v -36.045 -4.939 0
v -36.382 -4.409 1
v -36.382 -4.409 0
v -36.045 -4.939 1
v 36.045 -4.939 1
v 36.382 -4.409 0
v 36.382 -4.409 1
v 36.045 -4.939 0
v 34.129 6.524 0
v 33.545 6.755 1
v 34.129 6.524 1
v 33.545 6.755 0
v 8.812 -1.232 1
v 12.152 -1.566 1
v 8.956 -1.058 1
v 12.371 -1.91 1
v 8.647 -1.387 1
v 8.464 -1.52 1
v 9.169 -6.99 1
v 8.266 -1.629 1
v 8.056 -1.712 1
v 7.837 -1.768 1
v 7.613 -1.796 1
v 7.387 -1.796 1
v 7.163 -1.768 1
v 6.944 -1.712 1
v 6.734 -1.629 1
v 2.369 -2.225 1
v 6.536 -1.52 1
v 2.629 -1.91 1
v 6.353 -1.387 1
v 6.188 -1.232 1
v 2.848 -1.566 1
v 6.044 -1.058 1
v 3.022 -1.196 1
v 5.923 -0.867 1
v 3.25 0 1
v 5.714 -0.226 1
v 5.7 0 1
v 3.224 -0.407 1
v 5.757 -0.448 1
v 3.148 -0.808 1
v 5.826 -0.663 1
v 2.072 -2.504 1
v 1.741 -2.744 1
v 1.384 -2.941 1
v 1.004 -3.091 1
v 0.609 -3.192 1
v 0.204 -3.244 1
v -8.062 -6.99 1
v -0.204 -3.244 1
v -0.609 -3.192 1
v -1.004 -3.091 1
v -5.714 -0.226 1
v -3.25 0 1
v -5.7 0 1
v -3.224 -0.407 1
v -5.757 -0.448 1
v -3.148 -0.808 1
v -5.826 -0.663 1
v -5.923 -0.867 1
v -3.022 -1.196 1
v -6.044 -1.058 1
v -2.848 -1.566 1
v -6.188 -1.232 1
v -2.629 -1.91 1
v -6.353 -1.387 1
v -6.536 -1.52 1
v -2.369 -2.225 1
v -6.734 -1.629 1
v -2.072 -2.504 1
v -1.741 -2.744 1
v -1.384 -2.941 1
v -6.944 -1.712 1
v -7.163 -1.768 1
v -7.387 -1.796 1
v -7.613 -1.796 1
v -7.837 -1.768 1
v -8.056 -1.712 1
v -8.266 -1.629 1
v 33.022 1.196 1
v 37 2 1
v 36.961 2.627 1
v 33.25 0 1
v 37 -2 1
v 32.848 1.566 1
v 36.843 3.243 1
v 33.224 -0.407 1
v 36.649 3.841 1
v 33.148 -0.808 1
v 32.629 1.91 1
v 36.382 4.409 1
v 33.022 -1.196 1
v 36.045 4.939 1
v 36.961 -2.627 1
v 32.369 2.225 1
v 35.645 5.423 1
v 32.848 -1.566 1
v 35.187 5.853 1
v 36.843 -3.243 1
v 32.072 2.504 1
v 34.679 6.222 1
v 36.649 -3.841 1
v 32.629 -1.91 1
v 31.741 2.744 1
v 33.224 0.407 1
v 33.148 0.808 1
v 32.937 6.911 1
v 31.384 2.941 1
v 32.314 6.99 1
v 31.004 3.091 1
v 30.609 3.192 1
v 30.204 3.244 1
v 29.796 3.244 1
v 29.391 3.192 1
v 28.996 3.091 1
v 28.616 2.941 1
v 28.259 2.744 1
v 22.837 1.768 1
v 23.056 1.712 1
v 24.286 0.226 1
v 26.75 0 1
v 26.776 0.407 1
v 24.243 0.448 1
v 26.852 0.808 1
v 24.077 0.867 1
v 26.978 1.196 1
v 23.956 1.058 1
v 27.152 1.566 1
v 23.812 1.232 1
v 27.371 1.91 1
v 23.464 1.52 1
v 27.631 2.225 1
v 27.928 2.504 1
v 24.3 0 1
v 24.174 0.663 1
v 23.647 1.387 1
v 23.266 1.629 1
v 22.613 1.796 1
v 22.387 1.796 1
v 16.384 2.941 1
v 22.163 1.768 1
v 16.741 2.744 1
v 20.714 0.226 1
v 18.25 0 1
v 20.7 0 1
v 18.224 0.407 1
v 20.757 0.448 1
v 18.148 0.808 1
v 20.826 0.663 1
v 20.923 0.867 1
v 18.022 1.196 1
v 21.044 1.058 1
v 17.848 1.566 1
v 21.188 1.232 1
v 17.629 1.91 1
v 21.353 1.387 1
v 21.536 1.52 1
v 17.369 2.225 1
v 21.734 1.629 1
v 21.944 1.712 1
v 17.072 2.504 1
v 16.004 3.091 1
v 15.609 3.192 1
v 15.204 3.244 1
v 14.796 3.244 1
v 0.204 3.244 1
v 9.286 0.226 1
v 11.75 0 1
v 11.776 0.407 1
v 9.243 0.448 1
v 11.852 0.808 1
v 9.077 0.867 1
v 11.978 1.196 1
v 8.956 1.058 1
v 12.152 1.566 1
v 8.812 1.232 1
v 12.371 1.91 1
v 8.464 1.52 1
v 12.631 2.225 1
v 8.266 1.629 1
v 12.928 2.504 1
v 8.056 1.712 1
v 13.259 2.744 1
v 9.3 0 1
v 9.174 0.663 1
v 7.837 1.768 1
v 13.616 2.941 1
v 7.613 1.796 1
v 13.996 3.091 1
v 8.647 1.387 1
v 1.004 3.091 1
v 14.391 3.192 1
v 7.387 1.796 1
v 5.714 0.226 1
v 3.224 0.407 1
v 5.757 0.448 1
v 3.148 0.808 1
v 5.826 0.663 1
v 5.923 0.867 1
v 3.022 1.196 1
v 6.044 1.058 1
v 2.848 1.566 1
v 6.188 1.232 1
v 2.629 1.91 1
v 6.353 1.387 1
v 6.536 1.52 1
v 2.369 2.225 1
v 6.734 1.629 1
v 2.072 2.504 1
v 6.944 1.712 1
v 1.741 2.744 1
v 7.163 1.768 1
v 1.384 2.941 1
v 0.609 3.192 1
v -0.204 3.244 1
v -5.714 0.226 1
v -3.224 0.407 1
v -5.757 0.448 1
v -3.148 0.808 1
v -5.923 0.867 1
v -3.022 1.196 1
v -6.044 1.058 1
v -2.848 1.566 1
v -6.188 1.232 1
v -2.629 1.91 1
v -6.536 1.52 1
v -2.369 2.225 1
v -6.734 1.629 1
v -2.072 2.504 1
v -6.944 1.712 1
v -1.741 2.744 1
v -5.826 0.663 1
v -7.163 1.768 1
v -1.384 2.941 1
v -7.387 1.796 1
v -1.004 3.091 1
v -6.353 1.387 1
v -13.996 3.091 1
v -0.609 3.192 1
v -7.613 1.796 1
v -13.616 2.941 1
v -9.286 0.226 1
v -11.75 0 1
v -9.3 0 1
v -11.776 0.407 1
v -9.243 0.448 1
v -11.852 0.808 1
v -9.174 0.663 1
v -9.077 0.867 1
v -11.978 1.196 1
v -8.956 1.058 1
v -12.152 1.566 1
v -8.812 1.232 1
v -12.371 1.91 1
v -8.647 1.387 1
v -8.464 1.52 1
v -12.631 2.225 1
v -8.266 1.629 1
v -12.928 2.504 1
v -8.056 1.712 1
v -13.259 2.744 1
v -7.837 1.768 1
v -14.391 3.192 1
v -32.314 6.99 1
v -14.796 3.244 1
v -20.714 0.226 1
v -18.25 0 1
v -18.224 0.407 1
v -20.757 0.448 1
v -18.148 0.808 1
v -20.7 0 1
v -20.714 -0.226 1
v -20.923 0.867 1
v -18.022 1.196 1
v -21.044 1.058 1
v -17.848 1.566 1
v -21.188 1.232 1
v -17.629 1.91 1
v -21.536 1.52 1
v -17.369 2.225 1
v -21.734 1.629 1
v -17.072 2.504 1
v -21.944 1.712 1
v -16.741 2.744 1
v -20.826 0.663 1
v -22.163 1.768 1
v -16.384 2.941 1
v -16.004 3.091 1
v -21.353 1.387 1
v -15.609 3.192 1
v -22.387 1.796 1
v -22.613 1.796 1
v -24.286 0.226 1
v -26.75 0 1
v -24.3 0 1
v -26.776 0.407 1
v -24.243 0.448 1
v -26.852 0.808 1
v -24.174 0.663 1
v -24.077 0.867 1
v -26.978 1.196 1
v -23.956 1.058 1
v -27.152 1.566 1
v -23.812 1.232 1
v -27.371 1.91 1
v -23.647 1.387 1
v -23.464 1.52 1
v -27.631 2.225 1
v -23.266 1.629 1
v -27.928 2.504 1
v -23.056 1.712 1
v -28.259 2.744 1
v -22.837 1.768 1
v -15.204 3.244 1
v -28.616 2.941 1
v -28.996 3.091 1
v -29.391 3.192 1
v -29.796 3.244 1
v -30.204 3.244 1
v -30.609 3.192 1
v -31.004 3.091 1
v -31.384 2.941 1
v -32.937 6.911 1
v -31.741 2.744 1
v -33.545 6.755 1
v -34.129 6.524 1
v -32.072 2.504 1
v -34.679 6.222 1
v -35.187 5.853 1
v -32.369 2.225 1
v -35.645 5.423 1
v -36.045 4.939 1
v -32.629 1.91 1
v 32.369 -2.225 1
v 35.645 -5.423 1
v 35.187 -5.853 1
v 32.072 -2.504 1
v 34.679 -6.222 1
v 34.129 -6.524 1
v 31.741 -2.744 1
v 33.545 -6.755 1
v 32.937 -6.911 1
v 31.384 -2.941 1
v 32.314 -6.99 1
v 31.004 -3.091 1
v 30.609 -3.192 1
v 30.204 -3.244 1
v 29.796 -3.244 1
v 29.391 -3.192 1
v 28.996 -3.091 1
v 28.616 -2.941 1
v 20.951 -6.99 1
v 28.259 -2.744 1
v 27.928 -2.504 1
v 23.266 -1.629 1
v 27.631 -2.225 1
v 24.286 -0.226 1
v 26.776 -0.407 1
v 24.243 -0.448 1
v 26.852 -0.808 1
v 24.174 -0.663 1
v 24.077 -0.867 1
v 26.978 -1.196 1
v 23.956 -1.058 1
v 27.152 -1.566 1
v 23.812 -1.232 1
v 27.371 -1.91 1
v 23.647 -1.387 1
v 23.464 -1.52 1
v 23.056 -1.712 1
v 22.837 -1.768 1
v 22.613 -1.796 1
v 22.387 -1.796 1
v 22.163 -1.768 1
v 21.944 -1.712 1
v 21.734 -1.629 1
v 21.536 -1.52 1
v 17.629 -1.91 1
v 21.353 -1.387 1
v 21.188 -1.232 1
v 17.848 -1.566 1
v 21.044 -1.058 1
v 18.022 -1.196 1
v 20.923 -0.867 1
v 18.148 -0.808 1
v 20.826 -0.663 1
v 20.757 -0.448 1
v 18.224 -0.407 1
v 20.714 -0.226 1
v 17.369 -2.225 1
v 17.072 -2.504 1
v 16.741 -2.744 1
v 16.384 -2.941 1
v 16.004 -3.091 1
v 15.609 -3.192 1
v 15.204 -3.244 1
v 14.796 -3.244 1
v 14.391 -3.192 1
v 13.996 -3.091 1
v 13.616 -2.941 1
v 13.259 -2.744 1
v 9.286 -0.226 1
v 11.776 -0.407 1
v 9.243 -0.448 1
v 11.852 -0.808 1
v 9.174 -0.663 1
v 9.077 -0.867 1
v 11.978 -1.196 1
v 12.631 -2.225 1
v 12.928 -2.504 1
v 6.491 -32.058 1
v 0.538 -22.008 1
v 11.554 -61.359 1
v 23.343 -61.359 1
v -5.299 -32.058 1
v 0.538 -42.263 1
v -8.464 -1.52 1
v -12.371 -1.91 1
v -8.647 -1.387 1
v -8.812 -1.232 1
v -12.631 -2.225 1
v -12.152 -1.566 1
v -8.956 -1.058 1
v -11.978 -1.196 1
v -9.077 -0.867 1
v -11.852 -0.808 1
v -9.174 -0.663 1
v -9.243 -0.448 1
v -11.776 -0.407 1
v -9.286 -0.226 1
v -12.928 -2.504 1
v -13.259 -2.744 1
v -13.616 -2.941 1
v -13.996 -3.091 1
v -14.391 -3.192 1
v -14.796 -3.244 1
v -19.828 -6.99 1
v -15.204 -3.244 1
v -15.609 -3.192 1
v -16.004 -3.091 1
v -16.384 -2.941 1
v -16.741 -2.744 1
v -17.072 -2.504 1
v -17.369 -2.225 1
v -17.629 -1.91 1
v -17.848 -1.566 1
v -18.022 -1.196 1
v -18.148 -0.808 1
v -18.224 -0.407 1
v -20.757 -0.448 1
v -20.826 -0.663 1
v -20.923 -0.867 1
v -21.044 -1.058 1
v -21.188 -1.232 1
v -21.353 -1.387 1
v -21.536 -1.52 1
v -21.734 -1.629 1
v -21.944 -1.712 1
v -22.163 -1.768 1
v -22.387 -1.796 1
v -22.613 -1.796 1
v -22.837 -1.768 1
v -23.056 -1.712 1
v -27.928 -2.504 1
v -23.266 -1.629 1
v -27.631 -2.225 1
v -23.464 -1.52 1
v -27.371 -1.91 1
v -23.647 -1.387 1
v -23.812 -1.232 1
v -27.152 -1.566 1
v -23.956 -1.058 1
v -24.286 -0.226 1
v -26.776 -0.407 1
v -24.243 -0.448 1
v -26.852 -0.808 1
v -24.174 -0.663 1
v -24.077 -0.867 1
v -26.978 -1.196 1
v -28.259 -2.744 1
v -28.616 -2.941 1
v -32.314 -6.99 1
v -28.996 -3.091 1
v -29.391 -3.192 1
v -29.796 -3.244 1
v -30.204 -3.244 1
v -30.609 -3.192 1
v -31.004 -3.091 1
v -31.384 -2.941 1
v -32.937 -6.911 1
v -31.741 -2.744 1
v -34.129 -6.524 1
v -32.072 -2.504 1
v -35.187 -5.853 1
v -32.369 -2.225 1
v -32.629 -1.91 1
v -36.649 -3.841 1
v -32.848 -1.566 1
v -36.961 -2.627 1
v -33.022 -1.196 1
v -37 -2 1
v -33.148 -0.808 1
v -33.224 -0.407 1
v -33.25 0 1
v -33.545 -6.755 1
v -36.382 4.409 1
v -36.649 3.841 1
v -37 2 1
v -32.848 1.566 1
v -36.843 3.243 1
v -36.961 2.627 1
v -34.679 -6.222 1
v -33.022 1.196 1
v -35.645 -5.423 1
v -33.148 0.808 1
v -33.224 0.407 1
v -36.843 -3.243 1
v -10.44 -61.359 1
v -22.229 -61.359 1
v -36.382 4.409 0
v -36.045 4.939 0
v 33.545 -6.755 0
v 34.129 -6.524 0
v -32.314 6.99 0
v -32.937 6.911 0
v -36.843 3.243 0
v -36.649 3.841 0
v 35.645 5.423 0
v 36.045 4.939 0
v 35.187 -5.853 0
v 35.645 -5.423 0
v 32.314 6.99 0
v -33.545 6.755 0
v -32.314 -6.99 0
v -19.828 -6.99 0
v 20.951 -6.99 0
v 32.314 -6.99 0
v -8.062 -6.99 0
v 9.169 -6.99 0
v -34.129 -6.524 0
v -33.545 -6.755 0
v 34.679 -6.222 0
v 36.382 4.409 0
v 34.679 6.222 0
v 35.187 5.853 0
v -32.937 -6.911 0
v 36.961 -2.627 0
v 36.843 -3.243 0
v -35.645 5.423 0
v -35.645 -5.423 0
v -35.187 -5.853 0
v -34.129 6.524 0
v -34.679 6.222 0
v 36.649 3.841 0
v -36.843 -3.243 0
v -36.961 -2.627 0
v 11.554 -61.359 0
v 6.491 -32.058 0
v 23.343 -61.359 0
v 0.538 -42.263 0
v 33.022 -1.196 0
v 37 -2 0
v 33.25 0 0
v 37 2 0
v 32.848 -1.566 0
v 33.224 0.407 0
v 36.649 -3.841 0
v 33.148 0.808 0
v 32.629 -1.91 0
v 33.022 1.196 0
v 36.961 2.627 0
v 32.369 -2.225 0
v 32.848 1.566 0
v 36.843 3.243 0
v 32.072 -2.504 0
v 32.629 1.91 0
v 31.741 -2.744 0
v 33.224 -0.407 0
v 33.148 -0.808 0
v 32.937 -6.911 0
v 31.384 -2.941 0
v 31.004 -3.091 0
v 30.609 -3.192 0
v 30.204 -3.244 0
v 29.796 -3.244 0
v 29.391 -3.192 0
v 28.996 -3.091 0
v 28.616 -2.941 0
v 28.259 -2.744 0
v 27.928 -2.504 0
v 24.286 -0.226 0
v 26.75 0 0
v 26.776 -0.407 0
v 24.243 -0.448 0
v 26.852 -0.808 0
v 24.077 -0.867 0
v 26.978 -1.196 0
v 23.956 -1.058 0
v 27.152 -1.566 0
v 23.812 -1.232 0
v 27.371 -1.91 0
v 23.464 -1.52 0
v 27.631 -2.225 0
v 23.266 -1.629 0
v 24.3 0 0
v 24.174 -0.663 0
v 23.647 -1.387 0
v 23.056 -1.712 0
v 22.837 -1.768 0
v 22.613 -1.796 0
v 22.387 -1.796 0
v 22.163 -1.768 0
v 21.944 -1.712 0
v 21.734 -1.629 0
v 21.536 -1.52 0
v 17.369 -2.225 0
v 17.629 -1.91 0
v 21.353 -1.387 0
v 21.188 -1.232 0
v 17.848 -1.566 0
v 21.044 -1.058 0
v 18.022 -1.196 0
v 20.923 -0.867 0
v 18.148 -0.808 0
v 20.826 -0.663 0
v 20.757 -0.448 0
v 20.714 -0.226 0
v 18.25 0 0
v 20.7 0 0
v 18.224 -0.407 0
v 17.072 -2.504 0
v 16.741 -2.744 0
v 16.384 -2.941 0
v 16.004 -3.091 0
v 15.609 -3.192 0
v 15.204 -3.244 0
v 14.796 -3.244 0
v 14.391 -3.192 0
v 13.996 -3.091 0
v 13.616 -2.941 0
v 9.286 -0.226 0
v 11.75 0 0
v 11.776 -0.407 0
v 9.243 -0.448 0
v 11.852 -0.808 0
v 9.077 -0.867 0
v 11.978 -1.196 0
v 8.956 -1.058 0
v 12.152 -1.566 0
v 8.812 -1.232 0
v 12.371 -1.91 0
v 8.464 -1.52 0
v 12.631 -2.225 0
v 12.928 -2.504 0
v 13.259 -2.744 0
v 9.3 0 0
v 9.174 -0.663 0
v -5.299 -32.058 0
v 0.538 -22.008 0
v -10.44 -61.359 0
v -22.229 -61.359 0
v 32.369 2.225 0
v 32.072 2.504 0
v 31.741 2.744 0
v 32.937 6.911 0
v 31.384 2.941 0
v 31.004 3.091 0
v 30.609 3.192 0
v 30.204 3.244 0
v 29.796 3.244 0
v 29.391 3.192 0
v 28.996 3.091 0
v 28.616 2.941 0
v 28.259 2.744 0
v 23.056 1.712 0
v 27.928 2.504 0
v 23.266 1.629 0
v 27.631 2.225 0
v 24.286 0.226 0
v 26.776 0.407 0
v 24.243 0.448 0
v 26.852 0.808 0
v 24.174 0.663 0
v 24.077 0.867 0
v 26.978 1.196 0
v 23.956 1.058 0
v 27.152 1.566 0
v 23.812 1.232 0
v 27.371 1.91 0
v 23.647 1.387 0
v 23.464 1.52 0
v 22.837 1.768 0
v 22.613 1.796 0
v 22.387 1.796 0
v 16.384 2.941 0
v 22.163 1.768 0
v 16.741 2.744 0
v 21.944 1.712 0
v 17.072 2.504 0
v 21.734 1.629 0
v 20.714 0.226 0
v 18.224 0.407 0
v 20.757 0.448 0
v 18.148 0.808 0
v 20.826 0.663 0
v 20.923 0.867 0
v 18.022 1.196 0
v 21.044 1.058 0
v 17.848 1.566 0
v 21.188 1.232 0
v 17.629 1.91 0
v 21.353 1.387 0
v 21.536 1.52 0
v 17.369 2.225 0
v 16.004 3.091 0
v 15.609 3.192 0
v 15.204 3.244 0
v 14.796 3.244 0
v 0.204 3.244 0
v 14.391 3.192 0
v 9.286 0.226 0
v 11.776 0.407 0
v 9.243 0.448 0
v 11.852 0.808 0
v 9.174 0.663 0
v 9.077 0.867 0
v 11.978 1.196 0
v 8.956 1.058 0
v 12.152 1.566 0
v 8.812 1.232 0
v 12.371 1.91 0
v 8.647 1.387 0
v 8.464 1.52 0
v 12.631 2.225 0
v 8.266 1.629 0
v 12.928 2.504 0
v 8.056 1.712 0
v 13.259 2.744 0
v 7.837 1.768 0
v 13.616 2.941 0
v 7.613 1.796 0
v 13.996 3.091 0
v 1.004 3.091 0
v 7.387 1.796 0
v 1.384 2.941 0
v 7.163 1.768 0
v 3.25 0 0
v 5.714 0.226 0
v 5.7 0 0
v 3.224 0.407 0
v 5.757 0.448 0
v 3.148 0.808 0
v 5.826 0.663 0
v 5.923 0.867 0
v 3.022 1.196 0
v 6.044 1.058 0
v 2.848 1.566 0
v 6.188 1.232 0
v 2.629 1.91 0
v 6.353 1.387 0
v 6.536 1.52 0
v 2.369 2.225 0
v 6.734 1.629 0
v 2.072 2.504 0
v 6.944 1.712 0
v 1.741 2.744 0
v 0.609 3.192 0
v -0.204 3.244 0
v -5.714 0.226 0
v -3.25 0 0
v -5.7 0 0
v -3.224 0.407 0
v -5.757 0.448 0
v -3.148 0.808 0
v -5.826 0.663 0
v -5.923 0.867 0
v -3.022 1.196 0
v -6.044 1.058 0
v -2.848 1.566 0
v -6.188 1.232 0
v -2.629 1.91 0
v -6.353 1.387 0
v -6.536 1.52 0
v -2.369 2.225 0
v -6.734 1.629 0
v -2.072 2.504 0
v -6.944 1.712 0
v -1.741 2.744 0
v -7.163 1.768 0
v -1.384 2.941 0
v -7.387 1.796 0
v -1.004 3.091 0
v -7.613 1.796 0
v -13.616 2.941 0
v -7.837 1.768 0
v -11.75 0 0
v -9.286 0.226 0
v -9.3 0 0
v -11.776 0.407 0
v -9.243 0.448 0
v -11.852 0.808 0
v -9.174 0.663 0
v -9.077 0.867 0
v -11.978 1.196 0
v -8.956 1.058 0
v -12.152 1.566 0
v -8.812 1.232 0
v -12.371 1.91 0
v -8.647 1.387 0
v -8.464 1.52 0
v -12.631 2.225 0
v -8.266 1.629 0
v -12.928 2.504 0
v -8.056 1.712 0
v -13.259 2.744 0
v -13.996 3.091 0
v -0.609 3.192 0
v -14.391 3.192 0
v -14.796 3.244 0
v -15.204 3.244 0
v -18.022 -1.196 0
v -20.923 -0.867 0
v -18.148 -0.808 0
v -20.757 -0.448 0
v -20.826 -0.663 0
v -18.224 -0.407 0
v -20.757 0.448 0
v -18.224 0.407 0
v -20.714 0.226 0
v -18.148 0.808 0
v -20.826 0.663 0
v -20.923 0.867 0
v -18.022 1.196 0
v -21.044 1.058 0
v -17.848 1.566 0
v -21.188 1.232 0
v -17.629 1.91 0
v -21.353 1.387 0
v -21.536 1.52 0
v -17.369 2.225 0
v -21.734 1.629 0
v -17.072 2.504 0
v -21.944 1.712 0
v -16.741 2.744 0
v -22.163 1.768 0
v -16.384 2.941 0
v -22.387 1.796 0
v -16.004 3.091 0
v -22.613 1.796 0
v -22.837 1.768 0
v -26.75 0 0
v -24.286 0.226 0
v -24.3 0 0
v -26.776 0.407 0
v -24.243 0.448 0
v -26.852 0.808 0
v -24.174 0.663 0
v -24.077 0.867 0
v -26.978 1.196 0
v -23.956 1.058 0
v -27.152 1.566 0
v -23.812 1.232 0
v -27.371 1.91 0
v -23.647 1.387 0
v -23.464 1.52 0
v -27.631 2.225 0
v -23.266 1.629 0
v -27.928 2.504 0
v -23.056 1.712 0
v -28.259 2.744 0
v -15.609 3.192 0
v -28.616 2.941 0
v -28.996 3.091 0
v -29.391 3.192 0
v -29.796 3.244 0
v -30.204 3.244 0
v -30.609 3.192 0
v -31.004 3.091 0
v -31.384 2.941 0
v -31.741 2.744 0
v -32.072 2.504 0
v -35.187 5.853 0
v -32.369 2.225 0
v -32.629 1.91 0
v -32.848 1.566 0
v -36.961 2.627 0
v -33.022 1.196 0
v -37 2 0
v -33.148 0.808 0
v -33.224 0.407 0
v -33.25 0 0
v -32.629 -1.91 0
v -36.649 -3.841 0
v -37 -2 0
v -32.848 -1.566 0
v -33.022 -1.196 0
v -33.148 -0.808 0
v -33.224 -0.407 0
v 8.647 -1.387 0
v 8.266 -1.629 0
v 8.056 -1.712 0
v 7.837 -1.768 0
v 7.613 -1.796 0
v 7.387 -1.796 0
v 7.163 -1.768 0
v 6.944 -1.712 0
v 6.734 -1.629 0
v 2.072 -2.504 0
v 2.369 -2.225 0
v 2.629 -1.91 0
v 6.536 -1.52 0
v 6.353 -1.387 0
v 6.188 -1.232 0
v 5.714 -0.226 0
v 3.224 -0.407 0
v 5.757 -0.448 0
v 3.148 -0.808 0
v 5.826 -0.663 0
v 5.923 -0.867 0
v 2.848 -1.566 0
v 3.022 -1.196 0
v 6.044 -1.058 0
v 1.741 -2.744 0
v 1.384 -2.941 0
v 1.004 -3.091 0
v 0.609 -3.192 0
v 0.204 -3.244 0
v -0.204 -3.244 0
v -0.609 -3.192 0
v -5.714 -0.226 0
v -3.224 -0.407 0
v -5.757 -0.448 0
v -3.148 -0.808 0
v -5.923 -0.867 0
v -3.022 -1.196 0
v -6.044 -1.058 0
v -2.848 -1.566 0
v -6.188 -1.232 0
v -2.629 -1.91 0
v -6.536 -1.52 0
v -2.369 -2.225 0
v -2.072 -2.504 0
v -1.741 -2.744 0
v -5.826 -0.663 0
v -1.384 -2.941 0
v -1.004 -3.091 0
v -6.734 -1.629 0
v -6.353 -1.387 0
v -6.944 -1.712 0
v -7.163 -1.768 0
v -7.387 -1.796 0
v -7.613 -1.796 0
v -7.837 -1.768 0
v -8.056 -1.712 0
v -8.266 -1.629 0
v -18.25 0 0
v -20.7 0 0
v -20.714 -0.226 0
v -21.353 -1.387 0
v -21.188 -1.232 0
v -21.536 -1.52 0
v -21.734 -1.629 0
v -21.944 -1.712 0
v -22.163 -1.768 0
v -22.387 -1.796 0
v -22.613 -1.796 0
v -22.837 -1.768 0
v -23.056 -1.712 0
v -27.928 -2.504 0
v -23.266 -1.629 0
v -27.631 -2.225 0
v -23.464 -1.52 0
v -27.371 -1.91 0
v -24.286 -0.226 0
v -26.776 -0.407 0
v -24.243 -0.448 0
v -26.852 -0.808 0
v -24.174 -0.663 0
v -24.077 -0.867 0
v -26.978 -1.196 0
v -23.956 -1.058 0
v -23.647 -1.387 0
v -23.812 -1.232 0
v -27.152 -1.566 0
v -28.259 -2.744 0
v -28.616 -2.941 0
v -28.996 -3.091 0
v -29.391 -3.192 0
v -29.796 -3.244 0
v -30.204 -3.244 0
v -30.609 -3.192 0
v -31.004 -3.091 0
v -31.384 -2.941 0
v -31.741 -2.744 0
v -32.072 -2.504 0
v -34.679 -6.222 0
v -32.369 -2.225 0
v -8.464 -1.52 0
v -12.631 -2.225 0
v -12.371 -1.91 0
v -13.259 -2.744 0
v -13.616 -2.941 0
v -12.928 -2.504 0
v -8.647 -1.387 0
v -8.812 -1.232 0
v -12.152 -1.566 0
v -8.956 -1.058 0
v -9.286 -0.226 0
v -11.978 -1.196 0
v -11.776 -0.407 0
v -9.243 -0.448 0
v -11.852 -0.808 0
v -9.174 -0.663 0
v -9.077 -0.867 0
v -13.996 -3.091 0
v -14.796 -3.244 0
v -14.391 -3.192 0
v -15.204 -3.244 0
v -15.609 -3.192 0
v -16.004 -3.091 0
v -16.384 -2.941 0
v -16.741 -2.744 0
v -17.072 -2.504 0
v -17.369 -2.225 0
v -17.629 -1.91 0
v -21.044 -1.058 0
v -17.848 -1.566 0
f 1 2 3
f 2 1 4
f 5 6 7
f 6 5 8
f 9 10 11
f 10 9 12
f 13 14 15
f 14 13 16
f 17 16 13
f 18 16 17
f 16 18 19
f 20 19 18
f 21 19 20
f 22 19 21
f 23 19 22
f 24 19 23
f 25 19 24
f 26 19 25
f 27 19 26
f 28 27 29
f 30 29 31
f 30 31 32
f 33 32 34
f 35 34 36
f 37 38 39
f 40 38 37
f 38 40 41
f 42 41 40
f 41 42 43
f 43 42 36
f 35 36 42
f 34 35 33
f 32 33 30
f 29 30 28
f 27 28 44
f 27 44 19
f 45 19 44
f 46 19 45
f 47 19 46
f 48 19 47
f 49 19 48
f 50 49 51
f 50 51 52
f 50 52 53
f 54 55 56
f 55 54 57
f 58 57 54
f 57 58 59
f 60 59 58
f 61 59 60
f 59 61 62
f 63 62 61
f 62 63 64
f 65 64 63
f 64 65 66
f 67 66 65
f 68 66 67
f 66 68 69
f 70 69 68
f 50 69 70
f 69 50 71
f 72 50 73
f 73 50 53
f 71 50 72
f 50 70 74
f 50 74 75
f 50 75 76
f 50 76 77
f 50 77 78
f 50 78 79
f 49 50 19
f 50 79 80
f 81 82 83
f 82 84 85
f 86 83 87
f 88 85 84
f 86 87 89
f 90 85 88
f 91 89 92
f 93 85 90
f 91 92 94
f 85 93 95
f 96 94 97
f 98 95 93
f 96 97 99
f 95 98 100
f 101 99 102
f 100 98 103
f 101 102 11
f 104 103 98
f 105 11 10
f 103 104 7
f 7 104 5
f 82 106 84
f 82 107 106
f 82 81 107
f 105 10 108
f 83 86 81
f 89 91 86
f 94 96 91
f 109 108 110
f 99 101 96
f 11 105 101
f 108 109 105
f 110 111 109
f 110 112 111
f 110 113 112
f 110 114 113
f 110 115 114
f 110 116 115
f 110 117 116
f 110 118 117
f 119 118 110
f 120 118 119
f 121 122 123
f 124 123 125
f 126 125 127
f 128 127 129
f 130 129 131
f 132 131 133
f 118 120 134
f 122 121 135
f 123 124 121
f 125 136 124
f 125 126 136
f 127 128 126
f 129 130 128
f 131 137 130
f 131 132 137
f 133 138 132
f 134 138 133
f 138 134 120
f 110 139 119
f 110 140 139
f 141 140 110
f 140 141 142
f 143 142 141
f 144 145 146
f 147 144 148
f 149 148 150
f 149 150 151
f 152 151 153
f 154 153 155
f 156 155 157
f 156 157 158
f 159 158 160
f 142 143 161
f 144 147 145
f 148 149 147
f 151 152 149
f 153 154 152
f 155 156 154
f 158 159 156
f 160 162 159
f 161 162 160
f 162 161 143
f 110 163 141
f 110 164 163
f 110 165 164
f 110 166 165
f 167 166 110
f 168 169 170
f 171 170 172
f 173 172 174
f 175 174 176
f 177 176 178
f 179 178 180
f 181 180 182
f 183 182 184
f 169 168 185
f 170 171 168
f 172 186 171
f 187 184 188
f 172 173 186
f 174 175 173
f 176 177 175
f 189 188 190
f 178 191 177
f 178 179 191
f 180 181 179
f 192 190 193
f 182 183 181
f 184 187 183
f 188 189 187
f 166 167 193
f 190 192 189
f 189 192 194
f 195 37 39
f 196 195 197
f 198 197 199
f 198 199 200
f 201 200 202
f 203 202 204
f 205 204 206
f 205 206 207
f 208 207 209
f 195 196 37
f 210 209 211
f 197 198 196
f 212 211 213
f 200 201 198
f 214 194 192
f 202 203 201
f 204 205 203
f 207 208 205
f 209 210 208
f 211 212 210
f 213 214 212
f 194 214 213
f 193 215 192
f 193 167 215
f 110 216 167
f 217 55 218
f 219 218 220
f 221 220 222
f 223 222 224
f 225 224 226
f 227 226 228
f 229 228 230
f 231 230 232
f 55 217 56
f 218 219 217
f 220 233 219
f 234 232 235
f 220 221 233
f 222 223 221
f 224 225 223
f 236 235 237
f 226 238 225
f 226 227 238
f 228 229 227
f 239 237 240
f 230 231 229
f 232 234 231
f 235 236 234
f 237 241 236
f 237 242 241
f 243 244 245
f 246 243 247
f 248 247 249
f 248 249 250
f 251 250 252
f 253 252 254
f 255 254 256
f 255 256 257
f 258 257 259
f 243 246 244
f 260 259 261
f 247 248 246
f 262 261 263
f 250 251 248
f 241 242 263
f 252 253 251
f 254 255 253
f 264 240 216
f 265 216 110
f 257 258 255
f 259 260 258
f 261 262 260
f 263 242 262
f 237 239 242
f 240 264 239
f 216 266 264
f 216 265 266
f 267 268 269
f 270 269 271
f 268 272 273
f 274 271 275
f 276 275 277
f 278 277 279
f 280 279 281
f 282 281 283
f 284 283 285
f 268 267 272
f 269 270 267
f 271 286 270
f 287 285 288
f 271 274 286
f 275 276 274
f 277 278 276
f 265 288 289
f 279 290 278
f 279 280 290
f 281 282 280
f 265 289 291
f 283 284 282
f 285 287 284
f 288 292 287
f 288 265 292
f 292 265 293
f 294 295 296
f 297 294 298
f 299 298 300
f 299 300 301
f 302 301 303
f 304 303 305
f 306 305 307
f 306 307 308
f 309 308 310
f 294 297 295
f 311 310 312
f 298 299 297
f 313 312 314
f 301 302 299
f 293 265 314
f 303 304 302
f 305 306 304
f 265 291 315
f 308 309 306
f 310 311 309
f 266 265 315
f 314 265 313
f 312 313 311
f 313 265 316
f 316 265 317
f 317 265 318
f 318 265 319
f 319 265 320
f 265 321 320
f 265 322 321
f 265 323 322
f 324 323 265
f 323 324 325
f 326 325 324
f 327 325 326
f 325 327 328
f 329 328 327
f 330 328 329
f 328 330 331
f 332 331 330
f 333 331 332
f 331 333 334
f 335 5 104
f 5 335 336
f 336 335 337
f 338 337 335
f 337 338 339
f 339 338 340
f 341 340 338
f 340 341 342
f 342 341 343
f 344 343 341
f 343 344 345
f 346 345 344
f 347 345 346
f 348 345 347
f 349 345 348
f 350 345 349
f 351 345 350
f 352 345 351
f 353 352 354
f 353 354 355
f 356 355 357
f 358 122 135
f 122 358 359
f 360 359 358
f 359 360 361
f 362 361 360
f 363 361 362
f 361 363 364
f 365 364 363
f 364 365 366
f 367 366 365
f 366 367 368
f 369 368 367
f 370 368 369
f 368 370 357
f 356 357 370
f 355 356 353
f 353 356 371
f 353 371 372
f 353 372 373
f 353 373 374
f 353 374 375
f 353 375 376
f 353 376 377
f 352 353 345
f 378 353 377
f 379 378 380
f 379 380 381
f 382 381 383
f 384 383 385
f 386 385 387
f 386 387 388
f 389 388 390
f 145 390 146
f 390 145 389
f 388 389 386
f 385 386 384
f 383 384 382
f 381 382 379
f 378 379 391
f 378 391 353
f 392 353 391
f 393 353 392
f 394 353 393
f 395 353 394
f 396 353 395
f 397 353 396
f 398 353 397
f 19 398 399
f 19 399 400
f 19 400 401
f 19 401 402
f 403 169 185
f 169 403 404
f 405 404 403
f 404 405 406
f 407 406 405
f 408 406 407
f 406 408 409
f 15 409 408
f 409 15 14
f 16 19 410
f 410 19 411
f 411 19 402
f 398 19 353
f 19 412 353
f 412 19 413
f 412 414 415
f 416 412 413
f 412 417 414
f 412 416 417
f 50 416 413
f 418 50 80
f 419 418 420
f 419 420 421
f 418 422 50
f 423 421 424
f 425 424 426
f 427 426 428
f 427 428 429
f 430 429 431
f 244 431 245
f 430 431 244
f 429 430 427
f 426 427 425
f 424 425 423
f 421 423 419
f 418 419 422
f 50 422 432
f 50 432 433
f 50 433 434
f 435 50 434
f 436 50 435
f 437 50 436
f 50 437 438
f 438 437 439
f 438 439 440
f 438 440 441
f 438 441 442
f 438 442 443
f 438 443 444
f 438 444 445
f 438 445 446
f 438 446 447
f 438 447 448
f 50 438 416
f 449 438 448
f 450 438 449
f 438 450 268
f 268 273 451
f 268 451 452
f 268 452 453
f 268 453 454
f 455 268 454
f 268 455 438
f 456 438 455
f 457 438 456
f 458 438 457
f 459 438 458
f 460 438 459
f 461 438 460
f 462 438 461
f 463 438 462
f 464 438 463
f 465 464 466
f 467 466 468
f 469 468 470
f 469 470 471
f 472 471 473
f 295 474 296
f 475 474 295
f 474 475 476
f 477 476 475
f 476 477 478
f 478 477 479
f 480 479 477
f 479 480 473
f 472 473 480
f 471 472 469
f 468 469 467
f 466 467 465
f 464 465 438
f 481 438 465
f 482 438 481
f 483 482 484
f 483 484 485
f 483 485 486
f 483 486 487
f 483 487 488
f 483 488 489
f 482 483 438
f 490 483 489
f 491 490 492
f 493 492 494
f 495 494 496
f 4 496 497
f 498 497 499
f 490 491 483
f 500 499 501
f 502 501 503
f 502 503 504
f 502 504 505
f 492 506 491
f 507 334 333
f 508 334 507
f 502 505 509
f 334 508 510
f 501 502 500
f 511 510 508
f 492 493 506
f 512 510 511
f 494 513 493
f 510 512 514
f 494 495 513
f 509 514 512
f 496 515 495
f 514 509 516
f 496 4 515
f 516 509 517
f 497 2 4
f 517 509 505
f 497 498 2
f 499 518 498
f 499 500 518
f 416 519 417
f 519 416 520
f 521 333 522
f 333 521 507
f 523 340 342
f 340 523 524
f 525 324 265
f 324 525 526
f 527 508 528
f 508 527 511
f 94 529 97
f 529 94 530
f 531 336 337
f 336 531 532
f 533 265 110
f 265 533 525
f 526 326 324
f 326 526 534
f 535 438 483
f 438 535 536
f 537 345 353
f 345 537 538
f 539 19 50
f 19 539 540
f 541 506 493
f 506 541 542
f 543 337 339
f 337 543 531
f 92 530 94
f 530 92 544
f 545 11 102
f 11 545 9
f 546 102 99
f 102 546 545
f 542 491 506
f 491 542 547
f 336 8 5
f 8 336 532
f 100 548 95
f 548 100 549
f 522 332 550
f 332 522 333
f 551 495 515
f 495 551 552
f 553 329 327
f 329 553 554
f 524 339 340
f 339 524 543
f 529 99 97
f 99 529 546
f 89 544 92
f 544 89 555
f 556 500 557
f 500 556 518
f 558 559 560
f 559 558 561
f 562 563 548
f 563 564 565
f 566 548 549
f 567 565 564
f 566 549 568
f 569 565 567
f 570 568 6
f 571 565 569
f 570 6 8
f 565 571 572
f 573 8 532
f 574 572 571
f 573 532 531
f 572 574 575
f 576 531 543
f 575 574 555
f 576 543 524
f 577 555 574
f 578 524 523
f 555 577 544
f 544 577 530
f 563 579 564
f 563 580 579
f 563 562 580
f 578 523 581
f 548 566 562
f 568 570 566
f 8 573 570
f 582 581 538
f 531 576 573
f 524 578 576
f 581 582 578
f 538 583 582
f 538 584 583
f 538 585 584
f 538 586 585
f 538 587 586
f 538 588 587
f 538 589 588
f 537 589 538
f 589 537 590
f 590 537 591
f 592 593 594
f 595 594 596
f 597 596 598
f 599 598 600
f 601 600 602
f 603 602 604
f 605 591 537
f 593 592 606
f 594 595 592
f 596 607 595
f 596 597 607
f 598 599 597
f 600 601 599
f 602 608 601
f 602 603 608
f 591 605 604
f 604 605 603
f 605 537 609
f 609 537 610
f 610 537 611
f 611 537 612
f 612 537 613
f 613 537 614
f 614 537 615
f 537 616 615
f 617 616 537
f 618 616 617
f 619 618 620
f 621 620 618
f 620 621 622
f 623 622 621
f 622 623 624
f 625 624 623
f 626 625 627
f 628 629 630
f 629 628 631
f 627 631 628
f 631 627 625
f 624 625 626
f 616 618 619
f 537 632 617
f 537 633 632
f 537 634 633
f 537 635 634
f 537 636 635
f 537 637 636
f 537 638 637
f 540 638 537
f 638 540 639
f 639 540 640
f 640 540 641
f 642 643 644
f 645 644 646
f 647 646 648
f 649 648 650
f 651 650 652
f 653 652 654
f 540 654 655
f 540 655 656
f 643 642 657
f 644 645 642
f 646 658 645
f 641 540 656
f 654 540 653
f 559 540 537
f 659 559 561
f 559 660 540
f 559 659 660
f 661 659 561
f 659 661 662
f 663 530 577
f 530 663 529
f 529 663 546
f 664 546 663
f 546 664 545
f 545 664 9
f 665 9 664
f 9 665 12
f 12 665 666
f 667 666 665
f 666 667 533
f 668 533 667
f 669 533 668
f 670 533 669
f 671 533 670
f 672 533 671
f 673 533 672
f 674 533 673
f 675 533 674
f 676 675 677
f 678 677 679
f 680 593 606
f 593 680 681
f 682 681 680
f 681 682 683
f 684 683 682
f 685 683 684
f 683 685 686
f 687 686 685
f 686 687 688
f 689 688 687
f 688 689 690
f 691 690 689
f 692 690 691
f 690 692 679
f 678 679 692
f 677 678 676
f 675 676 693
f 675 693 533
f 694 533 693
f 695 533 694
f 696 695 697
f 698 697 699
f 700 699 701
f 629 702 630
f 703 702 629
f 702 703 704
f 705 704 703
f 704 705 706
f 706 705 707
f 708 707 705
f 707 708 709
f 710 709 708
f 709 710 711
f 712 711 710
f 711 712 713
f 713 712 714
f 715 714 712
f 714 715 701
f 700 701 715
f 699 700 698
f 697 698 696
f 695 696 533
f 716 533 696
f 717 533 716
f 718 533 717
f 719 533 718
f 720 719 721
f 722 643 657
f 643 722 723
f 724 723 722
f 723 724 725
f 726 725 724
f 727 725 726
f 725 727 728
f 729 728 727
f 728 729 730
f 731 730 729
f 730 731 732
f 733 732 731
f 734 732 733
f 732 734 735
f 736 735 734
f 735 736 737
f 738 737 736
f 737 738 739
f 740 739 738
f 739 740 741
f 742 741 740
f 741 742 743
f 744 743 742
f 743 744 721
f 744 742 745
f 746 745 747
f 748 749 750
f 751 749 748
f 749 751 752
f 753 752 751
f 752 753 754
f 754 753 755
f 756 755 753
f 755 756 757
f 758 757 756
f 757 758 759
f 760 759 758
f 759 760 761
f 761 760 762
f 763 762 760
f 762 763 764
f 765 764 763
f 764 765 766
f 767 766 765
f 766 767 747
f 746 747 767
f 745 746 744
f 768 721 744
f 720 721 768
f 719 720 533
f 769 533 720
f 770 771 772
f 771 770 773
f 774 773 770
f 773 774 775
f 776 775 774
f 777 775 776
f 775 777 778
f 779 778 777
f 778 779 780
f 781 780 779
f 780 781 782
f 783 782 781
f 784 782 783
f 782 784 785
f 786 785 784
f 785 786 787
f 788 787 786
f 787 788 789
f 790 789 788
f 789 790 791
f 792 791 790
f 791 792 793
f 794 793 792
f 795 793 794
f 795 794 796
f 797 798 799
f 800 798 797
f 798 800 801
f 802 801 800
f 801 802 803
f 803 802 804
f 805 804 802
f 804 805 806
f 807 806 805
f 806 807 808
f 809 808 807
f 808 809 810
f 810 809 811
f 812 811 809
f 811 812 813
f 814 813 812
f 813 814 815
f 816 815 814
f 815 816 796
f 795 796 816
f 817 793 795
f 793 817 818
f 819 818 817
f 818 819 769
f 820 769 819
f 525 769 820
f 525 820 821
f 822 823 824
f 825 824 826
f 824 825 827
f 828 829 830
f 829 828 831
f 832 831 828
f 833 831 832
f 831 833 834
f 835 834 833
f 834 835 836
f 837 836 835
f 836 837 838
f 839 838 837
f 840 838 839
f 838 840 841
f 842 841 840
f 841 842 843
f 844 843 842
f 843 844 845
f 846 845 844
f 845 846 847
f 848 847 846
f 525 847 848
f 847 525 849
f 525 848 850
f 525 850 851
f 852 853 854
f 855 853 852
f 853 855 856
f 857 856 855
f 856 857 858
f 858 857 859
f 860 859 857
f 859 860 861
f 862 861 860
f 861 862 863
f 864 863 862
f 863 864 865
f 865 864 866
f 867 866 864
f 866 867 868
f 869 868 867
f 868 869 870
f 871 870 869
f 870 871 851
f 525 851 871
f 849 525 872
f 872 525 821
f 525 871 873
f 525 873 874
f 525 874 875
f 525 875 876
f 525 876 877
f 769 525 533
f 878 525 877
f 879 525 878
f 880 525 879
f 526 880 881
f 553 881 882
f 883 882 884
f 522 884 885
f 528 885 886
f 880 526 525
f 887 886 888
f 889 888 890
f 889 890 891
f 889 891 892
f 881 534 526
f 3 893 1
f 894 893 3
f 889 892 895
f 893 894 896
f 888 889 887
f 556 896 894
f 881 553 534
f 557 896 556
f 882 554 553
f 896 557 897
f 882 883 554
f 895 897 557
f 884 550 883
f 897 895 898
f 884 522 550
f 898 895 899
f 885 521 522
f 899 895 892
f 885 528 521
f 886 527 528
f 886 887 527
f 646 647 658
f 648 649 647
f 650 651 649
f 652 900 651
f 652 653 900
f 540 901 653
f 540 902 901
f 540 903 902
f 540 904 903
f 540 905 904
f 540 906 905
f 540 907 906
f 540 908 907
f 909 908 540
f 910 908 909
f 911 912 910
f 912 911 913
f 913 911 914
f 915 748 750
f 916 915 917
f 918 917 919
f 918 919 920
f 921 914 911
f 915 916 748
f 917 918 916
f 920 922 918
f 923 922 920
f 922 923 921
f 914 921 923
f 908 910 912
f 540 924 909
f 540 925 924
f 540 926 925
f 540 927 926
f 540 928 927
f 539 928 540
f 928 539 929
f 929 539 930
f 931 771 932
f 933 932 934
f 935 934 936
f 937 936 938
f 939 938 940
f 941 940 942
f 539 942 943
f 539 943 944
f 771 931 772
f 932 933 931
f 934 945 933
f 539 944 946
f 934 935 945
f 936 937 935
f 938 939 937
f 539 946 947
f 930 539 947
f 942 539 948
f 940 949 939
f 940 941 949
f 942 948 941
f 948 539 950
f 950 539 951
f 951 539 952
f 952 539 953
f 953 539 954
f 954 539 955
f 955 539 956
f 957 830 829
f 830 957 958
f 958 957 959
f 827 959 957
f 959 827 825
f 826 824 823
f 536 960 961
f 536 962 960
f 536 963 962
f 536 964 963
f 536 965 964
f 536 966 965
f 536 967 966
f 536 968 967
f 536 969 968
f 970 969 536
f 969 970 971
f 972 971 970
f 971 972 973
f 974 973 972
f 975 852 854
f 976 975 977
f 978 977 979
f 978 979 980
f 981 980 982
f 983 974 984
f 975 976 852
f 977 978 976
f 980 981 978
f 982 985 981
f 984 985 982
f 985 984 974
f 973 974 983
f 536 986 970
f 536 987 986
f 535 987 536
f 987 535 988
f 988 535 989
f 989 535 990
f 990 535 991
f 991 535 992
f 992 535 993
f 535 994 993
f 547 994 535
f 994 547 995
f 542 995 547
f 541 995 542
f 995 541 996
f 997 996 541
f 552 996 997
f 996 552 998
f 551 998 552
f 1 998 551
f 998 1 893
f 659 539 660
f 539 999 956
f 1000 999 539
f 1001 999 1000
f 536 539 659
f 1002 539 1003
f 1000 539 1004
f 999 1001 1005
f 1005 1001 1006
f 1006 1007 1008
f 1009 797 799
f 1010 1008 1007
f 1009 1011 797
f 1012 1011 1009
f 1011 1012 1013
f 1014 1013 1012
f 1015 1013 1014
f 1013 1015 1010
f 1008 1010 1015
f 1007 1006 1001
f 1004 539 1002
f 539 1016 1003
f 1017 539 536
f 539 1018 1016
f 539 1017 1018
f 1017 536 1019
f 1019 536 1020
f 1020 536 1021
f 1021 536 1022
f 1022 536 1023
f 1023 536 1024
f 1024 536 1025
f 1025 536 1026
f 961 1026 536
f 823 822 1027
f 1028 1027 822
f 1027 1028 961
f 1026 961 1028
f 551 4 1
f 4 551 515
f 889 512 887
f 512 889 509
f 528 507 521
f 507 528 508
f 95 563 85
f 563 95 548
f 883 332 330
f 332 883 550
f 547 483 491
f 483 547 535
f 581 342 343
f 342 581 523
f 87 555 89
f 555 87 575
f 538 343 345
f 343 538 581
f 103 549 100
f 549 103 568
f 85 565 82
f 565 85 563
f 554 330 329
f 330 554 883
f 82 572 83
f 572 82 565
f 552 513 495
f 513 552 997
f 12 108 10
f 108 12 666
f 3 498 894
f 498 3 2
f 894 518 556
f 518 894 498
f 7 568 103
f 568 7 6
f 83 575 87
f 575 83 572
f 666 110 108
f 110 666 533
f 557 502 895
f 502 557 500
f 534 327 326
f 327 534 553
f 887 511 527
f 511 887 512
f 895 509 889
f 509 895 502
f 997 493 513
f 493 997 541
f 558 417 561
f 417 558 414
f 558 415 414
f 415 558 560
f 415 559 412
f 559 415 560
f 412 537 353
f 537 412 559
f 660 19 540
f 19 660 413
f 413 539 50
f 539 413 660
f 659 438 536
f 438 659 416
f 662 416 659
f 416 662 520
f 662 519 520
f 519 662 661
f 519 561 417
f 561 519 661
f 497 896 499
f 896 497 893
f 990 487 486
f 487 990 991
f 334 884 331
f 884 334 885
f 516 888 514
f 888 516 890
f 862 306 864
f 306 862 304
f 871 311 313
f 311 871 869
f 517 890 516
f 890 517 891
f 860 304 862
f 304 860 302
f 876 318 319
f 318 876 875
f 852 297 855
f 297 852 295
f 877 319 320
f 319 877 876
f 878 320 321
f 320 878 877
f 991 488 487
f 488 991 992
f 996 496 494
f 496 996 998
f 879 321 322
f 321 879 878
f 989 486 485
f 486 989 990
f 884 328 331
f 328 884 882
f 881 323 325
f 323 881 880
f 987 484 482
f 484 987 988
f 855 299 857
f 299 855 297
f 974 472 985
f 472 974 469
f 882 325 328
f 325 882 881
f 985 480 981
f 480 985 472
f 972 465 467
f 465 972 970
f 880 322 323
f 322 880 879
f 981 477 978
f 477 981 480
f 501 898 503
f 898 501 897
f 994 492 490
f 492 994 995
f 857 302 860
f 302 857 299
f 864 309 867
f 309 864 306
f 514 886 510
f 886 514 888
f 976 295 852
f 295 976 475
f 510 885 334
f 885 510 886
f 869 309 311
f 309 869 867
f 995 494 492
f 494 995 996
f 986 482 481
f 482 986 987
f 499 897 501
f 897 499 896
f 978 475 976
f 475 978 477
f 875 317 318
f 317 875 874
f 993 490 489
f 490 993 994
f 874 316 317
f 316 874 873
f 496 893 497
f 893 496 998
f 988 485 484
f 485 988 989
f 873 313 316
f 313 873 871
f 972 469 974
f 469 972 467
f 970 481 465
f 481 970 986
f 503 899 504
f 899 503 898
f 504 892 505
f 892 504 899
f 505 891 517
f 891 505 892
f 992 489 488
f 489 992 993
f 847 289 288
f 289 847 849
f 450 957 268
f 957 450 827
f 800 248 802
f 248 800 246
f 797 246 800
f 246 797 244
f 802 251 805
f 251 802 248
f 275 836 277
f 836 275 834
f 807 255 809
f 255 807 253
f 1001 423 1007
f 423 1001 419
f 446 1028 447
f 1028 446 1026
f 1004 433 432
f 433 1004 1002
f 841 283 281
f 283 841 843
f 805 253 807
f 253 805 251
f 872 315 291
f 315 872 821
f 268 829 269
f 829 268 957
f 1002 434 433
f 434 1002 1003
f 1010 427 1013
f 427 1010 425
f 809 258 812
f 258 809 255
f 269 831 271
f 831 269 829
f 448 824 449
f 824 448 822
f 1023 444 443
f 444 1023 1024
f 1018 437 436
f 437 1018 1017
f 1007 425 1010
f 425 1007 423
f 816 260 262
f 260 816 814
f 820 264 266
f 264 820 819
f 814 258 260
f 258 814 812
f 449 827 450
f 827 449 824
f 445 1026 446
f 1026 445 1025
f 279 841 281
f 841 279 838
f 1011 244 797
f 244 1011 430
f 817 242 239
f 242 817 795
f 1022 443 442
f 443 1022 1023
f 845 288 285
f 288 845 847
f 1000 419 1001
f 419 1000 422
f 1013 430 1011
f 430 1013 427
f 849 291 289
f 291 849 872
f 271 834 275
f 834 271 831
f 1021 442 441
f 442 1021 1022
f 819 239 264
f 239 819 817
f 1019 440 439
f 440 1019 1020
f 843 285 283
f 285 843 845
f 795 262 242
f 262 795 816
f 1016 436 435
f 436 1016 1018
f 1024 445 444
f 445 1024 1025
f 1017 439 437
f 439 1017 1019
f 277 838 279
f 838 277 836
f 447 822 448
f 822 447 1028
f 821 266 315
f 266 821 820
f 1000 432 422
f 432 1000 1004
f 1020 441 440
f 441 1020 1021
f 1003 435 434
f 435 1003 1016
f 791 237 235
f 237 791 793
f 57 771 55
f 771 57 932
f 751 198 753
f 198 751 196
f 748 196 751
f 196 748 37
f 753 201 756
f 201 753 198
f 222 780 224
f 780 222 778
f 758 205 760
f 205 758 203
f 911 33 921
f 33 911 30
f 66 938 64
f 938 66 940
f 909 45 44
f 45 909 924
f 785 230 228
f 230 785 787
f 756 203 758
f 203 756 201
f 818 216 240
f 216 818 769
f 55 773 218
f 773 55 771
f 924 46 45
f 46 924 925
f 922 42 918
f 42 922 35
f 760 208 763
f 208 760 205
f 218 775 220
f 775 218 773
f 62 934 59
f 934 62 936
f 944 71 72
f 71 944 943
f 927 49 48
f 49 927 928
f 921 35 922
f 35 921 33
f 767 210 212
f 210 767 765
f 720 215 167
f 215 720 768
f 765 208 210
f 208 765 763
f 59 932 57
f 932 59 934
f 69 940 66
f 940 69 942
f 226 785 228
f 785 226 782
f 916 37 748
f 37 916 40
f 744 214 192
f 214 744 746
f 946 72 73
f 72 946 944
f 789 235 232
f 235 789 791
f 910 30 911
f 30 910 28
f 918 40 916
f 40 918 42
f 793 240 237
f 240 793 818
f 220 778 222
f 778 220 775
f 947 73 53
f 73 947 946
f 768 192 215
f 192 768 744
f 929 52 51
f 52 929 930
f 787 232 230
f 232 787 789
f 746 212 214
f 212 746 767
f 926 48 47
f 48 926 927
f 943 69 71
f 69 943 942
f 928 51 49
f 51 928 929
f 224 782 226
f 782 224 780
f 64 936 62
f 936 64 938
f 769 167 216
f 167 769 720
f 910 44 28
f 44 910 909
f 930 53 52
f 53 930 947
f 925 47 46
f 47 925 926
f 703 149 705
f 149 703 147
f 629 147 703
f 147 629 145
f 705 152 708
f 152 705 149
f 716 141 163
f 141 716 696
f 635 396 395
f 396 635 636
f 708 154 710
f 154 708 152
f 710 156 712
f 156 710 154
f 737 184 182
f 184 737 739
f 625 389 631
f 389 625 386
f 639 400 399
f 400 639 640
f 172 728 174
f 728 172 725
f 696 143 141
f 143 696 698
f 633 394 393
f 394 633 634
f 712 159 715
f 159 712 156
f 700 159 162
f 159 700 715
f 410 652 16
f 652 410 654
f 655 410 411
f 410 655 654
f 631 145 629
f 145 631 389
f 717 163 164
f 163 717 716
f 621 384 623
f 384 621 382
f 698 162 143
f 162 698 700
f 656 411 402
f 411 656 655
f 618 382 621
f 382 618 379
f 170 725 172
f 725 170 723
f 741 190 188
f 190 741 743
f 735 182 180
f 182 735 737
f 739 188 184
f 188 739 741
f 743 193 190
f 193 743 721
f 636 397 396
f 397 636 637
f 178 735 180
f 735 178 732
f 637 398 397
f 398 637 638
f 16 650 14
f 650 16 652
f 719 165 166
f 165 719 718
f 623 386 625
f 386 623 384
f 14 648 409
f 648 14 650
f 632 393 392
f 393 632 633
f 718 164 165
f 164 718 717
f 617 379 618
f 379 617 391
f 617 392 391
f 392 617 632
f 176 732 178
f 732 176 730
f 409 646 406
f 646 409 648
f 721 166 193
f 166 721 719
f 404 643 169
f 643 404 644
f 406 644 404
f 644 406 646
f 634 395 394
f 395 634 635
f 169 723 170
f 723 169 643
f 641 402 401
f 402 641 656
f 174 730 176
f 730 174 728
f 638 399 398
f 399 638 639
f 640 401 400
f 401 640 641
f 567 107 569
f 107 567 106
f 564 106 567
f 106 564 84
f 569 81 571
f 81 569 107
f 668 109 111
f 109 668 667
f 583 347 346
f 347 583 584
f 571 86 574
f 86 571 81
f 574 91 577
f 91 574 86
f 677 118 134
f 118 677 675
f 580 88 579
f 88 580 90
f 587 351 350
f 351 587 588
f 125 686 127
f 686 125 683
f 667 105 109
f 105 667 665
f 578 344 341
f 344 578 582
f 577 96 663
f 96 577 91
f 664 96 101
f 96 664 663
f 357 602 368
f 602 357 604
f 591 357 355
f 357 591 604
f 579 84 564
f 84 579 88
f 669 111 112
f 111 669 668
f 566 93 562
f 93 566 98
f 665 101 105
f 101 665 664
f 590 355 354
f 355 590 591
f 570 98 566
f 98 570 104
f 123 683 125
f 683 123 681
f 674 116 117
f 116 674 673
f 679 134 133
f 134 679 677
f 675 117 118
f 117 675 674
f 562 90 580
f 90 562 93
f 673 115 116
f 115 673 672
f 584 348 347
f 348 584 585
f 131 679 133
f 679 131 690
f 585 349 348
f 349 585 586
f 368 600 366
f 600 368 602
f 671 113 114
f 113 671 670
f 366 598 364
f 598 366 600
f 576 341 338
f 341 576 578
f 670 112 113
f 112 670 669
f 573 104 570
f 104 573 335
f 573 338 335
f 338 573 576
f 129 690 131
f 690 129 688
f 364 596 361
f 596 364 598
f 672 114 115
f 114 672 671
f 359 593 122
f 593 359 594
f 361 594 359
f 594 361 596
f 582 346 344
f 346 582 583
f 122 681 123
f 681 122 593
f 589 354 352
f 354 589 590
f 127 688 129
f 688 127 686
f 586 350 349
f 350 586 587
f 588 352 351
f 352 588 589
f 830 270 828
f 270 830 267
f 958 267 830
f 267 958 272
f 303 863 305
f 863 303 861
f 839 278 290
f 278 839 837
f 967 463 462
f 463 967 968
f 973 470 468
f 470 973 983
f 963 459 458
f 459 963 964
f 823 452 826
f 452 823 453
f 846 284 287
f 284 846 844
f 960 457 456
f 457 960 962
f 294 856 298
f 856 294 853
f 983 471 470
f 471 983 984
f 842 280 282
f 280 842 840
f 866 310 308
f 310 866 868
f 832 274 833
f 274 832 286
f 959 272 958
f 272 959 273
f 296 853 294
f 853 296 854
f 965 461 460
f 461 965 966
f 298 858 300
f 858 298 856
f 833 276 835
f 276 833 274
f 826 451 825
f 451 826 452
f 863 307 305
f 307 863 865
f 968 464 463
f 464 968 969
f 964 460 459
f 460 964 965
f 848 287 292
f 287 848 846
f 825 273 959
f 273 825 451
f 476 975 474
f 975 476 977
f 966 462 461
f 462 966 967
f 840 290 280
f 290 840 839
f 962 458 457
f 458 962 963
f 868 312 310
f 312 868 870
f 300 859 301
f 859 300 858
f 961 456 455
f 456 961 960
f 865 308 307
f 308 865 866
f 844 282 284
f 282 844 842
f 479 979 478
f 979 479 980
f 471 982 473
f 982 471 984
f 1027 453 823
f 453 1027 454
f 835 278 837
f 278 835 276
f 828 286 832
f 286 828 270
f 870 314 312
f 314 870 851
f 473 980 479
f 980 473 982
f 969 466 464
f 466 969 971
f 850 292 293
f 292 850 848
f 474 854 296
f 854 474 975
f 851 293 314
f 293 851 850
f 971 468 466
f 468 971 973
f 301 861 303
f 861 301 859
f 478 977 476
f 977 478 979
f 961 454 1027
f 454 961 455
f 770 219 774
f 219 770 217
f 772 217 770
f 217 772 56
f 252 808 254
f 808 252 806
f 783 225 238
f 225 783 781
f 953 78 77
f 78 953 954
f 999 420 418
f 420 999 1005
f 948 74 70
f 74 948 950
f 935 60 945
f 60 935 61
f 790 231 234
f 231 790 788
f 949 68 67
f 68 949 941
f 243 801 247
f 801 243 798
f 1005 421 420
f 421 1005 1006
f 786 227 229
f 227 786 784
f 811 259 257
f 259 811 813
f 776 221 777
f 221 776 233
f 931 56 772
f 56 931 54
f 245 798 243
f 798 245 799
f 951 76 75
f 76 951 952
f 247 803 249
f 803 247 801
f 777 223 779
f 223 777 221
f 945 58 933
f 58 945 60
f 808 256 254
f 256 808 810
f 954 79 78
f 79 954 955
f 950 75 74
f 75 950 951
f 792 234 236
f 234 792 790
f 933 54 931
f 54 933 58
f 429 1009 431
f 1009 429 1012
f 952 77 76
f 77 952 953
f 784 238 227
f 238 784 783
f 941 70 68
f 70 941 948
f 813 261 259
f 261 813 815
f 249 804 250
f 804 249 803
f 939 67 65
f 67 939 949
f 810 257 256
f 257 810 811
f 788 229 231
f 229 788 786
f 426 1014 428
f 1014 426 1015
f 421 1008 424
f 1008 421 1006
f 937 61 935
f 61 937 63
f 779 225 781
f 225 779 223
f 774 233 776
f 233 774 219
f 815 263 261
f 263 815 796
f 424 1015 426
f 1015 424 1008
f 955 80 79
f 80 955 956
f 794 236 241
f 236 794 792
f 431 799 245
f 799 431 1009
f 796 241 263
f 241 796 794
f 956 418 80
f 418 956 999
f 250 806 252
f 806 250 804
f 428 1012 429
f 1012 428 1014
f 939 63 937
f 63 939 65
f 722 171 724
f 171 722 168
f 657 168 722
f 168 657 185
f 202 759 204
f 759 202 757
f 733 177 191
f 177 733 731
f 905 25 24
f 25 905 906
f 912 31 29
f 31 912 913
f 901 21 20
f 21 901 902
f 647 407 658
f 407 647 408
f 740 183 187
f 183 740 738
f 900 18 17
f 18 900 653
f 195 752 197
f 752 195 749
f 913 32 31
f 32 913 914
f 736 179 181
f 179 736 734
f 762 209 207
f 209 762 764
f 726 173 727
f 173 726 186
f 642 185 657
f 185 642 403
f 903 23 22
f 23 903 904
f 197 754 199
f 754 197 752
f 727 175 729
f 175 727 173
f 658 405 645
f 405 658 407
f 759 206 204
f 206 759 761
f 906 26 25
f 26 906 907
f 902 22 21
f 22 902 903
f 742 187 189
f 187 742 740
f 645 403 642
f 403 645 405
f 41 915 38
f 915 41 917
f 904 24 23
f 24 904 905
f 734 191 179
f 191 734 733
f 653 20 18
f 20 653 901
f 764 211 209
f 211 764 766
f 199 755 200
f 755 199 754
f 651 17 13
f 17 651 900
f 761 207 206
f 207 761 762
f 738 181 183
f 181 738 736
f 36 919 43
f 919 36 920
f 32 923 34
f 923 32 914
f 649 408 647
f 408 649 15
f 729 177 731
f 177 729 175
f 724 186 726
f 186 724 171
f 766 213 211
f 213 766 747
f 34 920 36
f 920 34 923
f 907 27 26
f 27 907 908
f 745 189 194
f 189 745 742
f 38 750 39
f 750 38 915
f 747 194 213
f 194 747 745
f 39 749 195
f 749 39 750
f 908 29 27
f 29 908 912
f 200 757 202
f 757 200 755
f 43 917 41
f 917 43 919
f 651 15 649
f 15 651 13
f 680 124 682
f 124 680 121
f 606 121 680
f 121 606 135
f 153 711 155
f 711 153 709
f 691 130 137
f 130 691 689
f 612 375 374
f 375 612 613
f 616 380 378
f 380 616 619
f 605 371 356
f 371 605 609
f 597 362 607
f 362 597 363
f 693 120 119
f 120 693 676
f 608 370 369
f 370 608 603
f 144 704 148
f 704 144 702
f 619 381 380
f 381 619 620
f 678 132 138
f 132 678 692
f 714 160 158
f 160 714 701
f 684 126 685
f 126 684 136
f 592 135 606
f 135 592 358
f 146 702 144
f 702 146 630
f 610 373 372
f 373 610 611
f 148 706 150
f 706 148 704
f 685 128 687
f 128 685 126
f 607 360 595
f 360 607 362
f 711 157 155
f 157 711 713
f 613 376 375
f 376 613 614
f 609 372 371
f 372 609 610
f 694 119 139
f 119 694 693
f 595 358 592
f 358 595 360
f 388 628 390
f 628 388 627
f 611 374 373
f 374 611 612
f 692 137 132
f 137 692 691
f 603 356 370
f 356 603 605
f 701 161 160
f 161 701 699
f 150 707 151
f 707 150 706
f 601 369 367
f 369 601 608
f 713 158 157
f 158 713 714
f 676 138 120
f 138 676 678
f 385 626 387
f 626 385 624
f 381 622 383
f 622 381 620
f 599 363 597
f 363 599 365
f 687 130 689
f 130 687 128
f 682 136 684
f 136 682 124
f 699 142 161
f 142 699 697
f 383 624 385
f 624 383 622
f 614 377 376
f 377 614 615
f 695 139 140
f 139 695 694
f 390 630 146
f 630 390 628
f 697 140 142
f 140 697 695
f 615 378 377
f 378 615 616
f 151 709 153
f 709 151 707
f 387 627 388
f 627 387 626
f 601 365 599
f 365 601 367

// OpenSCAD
$fn = 50;


difference() {
	union() {
		hull() {
			translate(v = [-32.0000000000, 2.0000000000, 0]) {
				cylinder(h = 1, r = 5);
			}
			translate(v = [32.0000000000, 2.0000000000, 0]) {
				cylinder(h = 1, r = 5);
			}
			translate(v = [-32.0000000000, -2.0000000000, 0]) {
				cylinder(h = 1, r = 5);
			}
			translate(v = [32.0000000000, -2.0000000000, 0]) {
				cylinder(h = 1, r = 5);
			}
		}
		translate(v = [0, -5, 0]) {
			linear_extrude(height = 1) {
				text(font = "DejaVu Sans Mono:style=Bold", halign = "center", size = 57.0000000000, text = "X", valign = "top");
			}
		}
	}
	union() {
		translate(v = [-30.0000000000, 0.0000000000, 0]) {
			translate(v = [0, 0, -100]) {
				cylinder(h = 200, r = 3.2500000000);
			}
		}
		translate(v = [-15.0000000000, 0.0000000000, 0]) {
			translate(v = [0, 0, -100]) {
				cylinder(h = 200, r = 3.2500000000);
			}
		}
		translate(v = [0, 0, -100]) {
			cylinder(h = 200, r = 3.2500000000);
		}
		translate(v = [15.0000000000, 0.0000000000, 0]) {
			translate(v = [0, 0, -100]) {
				cylinder(h = 200, r = 3.2500000000);
			}
		}
		translate(v = [30.0000000000, 0.0000000000, 0]) {
			translate(v = [0, 0, -100]) {
				cylinder(h = 200, r = 3.2500000000);
			}
		}
		translate(v = [-30.0000000000, 0.0000000000, 0]) {
			translate(v = [0, 0, -100]) {
				cylinder(h = 200, r = 1.8000000000);
			}
		}
		translate(v = [-22.5000000000, 0.0000000000, 0]) {
			translate(v = [0, 0, -100]) {
				cylinder(h = 200, r = 1.8000000000);
			}
		}
		translate(v = [-15.0000000000, 0.0000000000, 0]) {
			translate(v = [0, 0, -100]) {
				cylinder(h = 200, r = 1.8000000000);
			}
		}
		translate(v = [-7.5000000000, 0.0000000000, 0]) {
			translate(v = [0, 0, -100]) {
				cylinder(h = 200, r = 1.8000000000);
			}
		}
		translate(v = [0, 0, -100]) {
			cylinder(h = 200, r = 1.8000000000);
		}
		translate(v = [7.5000000000, 0.0000000000, 0]) {
			translate(v = [0, 0, -100]) {
				cylinder(h = 200, r = 1.8000000000);
			}
		}
		translate(v = [15.0000000000, 0.0000000000, 0]) {
			translate(v = [0, 0, -100]) {
				cylinder(h = 200, r = 1.8000000000);
			}
		}
		translate(v = [22.5000000000, 0.0000000000, 0]) {
			translate(v = [0, 0, -100]) {
				cylinder(h = 200, r = 1.8000000000);
			}
		}
		translate(v = [30.0000000000, 0.0000000000, 0]) {
			translate(v = [0, 0, -100]) {
				cylinder(h = 200, r = 1.8000000000);
			}
		}
	}
}
